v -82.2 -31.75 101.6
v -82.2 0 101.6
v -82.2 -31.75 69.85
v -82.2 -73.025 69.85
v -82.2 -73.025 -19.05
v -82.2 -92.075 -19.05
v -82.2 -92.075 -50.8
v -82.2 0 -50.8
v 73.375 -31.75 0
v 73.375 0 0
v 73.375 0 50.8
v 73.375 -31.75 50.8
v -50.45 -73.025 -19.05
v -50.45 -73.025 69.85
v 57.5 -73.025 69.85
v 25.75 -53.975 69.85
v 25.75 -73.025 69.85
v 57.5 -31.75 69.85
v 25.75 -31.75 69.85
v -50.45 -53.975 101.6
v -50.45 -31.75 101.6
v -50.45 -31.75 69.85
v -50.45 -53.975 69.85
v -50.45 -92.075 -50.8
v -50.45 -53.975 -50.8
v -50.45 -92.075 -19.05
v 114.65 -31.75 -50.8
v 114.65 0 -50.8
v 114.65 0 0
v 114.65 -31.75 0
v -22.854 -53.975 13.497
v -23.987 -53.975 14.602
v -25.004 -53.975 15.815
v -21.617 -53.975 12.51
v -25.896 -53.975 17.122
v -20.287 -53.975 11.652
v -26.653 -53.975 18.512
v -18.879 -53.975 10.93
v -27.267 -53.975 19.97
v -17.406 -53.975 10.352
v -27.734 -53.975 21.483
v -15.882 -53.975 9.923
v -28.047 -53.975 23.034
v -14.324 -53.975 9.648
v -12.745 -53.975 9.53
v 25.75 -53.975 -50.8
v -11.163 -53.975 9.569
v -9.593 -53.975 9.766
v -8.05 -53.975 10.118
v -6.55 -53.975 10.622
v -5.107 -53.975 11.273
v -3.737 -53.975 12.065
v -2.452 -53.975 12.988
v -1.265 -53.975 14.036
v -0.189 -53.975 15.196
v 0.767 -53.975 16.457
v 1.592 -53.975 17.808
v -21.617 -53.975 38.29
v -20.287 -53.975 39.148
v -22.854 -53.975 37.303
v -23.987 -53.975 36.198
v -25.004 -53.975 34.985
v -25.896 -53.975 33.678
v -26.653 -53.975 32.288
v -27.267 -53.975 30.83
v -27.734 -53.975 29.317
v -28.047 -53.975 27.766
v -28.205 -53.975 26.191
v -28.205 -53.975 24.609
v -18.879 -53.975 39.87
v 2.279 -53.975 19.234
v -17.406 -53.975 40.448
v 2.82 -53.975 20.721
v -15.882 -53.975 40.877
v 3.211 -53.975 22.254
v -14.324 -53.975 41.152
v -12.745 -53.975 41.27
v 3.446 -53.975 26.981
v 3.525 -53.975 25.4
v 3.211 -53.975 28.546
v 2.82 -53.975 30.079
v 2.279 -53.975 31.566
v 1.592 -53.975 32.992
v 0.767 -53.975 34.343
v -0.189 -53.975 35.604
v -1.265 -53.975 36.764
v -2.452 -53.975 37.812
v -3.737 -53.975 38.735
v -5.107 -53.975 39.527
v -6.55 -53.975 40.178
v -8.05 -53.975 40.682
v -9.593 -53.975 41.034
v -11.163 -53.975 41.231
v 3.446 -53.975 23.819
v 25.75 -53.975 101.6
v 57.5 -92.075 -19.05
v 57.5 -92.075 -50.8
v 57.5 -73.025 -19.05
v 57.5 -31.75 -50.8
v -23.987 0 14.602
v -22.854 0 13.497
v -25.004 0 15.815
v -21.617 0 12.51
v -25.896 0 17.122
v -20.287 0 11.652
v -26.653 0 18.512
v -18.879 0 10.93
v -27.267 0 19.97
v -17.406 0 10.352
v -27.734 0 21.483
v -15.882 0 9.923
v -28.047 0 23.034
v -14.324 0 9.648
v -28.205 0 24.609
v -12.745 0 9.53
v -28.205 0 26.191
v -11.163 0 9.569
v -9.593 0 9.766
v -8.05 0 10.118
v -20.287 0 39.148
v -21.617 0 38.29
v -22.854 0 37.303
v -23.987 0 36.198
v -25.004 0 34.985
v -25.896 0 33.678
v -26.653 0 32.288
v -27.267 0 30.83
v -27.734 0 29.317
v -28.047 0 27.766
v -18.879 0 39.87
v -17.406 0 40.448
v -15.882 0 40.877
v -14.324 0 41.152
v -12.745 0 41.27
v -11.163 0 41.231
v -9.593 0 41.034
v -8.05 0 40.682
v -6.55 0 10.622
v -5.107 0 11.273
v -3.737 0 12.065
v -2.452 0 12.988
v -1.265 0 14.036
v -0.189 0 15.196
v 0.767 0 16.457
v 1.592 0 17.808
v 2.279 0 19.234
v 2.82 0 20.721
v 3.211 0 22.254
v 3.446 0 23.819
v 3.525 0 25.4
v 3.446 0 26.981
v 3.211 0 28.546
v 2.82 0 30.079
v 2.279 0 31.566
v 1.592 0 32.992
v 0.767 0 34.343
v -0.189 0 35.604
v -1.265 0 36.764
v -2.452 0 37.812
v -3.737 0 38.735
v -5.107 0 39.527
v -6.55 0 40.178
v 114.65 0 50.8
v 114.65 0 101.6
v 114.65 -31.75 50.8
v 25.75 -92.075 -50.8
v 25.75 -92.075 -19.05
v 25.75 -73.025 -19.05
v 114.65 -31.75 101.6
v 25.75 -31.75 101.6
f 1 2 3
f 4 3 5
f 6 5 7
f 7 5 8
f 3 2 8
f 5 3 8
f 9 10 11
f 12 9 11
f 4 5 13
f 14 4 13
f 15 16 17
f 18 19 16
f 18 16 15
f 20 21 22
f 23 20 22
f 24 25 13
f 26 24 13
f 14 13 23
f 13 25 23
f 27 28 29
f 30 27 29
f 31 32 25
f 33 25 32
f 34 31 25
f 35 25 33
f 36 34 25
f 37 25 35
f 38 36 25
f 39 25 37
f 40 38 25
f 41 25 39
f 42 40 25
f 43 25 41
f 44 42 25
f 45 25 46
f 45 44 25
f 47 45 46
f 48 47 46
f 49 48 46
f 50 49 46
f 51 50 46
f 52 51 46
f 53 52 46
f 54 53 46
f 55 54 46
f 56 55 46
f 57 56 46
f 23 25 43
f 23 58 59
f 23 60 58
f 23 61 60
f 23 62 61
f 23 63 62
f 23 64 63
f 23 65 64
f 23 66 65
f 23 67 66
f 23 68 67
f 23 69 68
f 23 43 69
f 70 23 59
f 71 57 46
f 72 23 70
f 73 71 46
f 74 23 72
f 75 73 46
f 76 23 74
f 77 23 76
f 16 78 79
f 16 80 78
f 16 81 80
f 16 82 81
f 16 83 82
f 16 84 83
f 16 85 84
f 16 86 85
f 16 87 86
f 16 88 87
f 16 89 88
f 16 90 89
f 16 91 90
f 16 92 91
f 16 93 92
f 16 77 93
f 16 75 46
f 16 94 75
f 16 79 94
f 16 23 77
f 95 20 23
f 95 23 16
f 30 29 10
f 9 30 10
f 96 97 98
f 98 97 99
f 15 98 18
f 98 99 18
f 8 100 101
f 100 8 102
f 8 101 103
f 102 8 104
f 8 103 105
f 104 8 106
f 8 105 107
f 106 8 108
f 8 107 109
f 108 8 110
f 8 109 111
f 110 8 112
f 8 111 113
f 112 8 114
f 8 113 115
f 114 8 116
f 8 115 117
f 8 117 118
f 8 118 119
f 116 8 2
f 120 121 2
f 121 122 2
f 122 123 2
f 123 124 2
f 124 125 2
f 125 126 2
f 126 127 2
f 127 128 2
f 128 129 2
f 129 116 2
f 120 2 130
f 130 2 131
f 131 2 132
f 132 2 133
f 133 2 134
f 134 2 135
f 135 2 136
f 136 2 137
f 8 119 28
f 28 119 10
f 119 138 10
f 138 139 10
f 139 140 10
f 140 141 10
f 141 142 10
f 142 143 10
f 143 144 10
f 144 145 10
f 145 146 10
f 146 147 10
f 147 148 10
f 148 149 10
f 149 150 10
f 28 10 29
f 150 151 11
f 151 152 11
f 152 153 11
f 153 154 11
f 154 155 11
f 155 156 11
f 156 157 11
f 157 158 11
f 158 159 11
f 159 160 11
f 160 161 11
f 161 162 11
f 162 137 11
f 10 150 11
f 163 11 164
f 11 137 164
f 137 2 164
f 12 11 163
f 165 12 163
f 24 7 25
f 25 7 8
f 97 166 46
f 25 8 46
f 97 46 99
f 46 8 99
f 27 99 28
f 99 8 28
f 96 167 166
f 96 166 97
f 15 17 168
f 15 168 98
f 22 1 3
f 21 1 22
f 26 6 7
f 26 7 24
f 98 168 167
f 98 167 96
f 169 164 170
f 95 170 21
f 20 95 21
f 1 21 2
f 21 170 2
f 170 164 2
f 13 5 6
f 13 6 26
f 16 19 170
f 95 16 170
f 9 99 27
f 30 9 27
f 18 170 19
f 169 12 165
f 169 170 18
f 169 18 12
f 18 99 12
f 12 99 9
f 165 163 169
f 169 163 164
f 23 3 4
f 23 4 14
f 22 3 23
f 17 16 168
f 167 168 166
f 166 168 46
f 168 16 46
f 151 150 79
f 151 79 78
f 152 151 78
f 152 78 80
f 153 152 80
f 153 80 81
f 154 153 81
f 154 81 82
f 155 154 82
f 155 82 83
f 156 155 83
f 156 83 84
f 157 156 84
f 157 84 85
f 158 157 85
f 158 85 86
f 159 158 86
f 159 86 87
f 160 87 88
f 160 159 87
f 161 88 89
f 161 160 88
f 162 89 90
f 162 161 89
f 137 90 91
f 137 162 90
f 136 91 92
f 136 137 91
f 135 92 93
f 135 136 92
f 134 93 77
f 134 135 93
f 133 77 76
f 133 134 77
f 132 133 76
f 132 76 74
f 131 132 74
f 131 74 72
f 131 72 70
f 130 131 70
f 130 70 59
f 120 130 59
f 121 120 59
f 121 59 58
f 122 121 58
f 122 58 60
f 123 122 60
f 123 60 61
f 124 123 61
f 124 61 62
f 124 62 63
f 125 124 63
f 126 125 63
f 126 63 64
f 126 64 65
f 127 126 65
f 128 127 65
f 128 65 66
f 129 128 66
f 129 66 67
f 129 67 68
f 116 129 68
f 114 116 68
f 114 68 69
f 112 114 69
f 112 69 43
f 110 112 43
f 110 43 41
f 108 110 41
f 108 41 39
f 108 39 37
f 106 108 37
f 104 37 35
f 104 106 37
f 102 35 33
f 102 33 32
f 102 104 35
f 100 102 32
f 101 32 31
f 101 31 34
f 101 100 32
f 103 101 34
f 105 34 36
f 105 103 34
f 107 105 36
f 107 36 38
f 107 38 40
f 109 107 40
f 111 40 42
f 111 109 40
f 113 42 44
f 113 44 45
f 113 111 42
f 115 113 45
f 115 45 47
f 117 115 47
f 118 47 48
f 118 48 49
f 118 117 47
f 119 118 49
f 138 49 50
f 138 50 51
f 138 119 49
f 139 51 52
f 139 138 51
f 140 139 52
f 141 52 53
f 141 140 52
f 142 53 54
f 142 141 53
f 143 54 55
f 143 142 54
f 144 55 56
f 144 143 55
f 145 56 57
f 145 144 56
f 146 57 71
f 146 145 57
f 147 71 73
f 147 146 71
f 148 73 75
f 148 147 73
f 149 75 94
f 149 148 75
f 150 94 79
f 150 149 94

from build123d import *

# Parameters (mm, degrees)
F0_W     = 31.75
F0_H     = 88.9
F0_H_2   = 31.75
F0_R     = 15.875
F1_DEPTH = 31.75
F2_DEPTH = 73.025
F3_DEPTH = 73.025
F4_DEPTH = 92.075
F5_DEPTH = 53.975


# Not quite as in the source:
# - a feature names something its author has since deleted; it is built from what else it names


with BuildPart() as f1:
    # F0 (on Front) → F1 (new body)
    with BuildSketch(Plane.XZ):
        Polygon((114.6503422856, 101.6), (57.5003422856, 101.6), (57.5003422856, 69.85), (57.5003422856, -19.05), (57.5003422856, -50.8), (114.6503422856, -50.8), (114.6503422856, 0), (73.3753422856, 0), (73.3753422856, 50.8), (114.6503422856, 50.8), align=None)
        with Locations((41.6253422856, 25.4)):
            Rectangle(F0_W, F0_H)
        with Locations((41.6253422856, -34.925)):
            Rectangle(F0_W, F0_H_2)
        Polygon((-12.3496577144, 101.6), (-50.4496577144, 101.6), (-50.4496577144, 69.85), (-50.4496577144, -19.05), (-50.4496577144, -50.8), (25.7503422856, -50.8), (25.7503422856, -19.05), (25.7503422856, 69.85), (25.7503422856, 101.6), align=None)
        with Locations((-12.3496577144, 25.4)):
            Circle(F0_R, mode=Mode.SUBTRACT)
        with Locations((-66.3246577144, 25.4)):
            Rectangle(F0_W, F0_H)
        with Locations((-66.3246577144, -34.925)):
            Rectangle(F0_W, F0_H_2)
        with Locations((-66.3246577144, 85.725)):
            Rectangle(F0_W, F0_H_2)
        with Locations((41.6253422856, 85.725)):
            Rectangle(F0_W, F0_H_2)
    extrude(amount=F1_DEPTH)

    # F0 (on Front) → F2 (join)
    with BuildSketch(Plane.XZ):
        with Locations((-66.3246577144, 25.4)):
            Rectangle(F0_W, F0_H)
        with Locations((-66.3246577144, -34.925)):
            Rectangle(F0_W, F0_H_2)
    extrude(amount=F2_DEPTH)

    # F0 (on Front) → F3 (join)
    with BuildSketch(Plane.XZ):
        with Locations((41.6253422856, -34.925)):
            Rectangle(F0_W, F0_H_2)
        with Locations((41.6253422856, 25.4)):
            Rectangle(F0_W, F0_H)
    extrude(amount=F3_DEPTH)

    # F0 (on Front) → F4 (join)
    with BuildSketch(Plane.XZ):
        with Locations((-66.3246577144, -34.925)):
            Rectangle(F0_W, F0_H_2)
        with Locations((41.6253422856, -34.925)):
            Rectangle(F0_W, F0_H_2)
    extrude(amount=F4_DEPTH)

    # F0 (on Front) → F5 (join)
    with BuildSketch(Plane.XZ):
        Polygon((-12.3496577144, 101.6), (-50.4496577144, 101.6), (-50.4496577144, 69.85), (-50.4496577144, -19.05), (-50.4496577144, -50.8), (25.7503422856, -50.8), (25.7503422856, -19.05), (25.7503422856, 69.85), (25.7503422856, 101.6), align=None)
        with Locations((-12.3496577144, 25.4)):
            Circle(F0_R, mode=Mode.SUBTRACT)
    extrude(amount=F5_DEPTH)


solid = f1.part
